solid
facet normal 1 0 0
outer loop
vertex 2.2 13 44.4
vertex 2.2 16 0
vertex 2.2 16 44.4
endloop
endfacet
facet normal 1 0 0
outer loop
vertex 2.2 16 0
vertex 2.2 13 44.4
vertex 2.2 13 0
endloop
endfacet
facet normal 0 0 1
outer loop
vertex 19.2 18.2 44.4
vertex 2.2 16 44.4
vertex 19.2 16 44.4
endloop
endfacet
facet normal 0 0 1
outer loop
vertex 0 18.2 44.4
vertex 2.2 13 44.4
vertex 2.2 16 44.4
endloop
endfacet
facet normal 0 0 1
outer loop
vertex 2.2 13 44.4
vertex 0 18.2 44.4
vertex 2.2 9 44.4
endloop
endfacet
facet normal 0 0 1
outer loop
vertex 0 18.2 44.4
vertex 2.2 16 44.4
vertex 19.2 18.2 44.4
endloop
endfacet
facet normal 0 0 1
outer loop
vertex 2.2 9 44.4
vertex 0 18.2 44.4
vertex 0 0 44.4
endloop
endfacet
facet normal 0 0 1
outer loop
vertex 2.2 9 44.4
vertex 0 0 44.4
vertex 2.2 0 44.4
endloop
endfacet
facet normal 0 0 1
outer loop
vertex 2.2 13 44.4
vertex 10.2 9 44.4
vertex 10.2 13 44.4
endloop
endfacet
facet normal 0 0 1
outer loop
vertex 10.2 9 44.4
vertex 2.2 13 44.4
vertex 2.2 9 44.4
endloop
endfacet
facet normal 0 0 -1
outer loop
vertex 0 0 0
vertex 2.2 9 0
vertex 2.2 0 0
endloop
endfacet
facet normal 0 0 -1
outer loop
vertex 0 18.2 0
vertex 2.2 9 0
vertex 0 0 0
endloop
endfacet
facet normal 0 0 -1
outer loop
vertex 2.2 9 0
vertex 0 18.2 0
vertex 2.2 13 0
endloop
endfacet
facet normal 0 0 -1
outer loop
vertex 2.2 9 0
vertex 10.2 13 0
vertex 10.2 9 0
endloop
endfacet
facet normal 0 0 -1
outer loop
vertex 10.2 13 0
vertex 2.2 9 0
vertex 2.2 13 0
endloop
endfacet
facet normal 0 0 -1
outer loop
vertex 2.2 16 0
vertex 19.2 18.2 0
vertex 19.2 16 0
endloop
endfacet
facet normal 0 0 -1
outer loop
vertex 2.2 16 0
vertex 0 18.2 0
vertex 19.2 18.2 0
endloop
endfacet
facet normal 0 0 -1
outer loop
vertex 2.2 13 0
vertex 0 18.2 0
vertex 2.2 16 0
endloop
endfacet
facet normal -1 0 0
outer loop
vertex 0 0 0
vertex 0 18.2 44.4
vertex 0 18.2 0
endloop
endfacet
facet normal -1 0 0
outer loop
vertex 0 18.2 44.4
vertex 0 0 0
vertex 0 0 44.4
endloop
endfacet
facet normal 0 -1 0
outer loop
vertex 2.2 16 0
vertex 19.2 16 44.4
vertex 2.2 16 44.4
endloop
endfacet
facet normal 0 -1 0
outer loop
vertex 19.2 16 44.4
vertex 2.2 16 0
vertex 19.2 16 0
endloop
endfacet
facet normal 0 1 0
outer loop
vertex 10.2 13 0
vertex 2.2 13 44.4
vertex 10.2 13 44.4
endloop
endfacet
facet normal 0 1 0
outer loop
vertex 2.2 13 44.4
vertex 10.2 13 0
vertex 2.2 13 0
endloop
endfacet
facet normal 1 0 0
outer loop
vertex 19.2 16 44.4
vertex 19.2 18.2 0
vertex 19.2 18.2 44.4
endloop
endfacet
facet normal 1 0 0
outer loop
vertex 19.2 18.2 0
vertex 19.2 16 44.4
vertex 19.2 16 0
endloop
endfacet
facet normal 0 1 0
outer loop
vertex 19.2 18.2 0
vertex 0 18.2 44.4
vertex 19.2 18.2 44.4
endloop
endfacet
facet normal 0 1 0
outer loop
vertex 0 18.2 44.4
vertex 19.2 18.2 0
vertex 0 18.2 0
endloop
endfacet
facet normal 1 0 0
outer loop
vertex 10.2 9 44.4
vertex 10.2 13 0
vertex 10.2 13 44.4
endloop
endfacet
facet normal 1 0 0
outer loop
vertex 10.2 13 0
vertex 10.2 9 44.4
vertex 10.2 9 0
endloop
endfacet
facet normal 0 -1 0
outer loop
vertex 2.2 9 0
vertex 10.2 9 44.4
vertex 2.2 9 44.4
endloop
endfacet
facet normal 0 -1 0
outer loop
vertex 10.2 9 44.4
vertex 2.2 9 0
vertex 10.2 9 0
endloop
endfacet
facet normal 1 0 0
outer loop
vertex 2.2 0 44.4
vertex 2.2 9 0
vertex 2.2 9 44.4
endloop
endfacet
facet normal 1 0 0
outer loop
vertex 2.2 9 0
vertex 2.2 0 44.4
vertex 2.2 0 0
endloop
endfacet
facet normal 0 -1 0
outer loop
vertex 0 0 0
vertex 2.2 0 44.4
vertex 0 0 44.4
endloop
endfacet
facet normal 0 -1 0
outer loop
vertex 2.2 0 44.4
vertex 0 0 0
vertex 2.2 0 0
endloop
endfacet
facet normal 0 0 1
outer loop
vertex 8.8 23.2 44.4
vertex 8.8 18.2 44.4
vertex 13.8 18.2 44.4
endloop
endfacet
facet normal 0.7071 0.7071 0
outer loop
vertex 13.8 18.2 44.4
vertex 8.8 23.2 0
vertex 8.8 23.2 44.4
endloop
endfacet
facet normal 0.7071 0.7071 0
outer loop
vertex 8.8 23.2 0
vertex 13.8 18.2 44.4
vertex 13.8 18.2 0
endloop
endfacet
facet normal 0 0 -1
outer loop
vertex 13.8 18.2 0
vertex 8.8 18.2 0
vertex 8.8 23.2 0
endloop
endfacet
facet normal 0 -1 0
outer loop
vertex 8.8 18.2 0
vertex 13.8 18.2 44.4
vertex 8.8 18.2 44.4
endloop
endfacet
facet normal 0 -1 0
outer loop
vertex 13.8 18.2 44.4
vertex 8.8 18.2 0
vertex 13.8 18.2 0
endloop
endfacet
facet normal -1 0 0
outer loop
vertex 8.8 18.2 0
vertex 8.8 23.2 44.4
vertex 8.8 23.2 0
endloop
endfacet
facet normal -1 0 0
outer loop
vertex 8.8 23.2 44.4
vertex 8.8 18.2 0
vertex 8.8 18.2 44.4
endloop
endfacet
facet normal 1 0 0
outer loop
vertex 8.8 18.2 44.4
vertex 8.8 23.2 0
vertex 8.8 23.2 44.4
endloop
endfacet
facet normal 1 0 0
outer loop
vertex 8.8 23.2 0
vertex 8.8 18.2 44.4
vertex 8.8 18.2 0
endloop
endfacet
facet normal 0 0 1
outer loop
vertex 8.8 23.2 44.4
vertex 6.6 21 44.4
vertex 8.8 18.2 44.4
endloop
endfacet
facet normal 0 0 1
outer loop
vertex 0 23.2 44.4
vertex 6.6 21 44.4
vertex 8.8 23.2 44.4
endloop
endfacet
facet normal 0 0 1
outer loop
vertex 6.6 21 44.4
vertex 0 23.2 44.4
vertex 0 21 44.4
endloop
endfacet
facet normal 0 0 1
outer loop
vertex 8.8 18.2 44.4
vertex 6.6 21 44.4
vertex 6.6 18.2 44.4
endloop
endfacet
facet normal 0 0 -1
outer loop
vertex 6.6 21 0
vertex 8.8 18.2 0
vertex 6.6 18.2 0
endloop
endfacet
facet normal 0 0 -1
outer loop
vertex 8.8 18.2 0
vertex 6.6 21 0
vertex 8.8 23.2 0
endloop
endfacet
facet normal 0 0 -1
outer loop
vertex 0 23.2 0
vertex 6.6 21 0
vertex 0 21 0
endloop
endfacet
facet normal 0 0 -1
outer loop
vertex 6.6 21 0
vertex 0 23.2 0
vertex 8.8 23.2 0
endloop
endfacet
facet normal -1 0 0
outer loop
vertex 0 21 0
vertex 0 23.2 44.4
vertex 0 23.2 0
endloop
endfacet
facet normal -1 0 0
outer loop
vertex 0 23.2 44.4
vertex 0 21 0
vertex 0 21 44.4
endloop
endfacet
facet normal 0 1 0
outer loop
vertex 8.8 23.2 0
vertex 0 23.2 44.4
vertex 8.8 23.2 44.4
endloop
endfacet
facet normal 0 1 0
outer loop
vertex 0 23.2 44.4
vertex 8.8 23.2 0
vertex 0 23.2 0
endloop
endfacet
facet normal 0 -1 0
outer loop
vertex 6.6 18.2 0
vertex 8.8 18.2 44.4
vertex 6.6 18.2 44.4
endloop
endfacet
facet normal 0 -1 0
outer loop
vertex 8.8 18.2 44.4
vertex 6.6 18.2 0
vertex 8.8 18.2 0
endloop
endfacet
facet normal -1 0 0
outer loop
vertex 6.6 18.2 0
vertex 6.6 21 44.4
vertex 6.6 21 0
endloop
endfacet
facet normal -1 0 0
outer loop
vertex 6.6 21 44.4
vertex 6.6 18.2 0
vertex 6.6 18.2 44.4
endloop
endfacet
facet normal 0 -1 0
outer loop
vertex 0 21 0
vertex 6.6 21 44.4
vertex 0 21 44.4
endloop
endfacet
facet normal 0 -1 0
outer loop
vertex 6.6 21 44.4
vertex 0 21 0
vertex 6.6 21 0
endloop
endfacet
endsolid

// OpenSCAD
$fn = 60;

hor2Gleuf       =    9;  // afstand van hor tot de inkeping in het profiel
bGleuf          =    4;  // breedte van inkeping in het profiel
dGleuf          =    8;  // diepte van inkeping in het profiel
gleuf2Rand      =    3;  // vanaf inkeping tot rand van het profiel
dMax            =    5;  // maximaal uitsteken vanaf het profiel
rand2Profiel    =   17;
dStang          = 10.2; // diameter verstovingingsstangen

dMagneet        = 20;   // diameter magneet
hMagneet        = 1.2;  // hoogte magneet

wall = 2.2;
plaat = 2.8;

/////////// berekend //////////////////
hProfiel = hor2Gleuf + bGleuf + gleuf2Rand + wall;

translate([dMagneet, 0, 0] * 0) plaatClip();
//translate([dMagneet, 0, 0] * 3) magneetClip();
//translate([dMagneet, 0, 0] * 6) stangClipMagneet();


module plaatClip() {
    h = dMagneet * 2 + wall * 2;
    cube = [wall * 4 , wall + plaat, h];
    profiel(h);
    translate([cube.x, hProfiel, 0]) {
        steun(h = h, b = cube.y);
    }
    
    translate([0, hProfiel , 0]) {
        difference() {
            cube(cube);
            translate([-wall, 0, -h]) {
                cube([wall * 4, plaat, h * 3]);
            }
        }
    }
}

module steun(h=100, b = 10) {
    
    cube = [b / cos(45), b / cos(45), h];
    translate([0, 0, h / 2]) {
        difference() {
            rotate([0, 0, 45])
                cube (cube, center = true);
            translate([-cube.x, -cube.y * 2, -cube.z])
                cube(cube * 2, center = false);
            translate([-cube.x * 2, -cube.y, -cube.z])
                cube(cube * 2, center = false);
        }
    }
}

module stangClipMagneet() {
    h = dMagneet + wall * 2;
    dOut = dStang + wall * 2;
    dx = (dStang + wall) / 2;
    y = h * 2 ;
    dM = y/2 - wall -dMagneet / 2;
    
    translate([0, 0, h/2]) {
        difference() {
            union() {
                rotate([0, 0, 180])
                klem(dIn = dStang, dOut = dOut, h = h, hoek = 60);
                translate([dx, 0, 0]) {
                    cube([wall, y, h], center = true);  
                }
                translate([dOut / 4, 0, 0]) {
                    cube([dOut / 2, dOut, h], center = true);
                }
            }
            cylinder(d = dStang, h = h * 2, center = true);
            for (i = [-1, 1]) {
                translate([dx + wall / 2 - hMagneet, dM * i, 0])
                    rotate([0, 90, 0])
                        cylinder(d = dMagneet, h = h); 
            }
        }
    }
}

module klem(dIn = 100, dOut = 150, h = 100, hoek = 20) {
    rotate([0, 0, -90]) {
        difference() {
            cylinder(d = dOut, h = h, center = true); 
            cylinder(d = dIn, h = h * 2, center = true);
            translate([0, 0, -h])
            driehoek(hoek = hoek, l = h, h = h * 2); 
        }
        
        hk = hoek / 2;
        dC = (dOut - dIn) / 2;
        l = (dIn + dC) / 2;
        for(i = [1, -1]) {
            translate(l * [i * cos(hk), sin(hk)]) {
                cylinder(d = dC, h = h, center = true);
            }
        }
    }
}

/*
    gelijkbenige driehoek
    met de opgegeven hoek en hoogte
 */
module driehoek(hoek, l, h) {
    
    hk = hoek / 2;
    x = l / sin(hk);
    linear_extrude(h) {
        polygon([[0, 0], x * [cos(hk), sin(hk)], x * [-cos(hk), sin(hk)]]); 
    }
}

module hoek() {
}

module magneetClip() {
    h = dMagneet + wall * 2;
    cube = [wall * 2 + dMagneet, wall * 2, h];
    dY = hProfiel - cube.y;
    difference() {
        union() {
            profiel(h);
            translate([-cube.x, dY, 0]) {
                cube(cube);
            }
            translate([0, dY, h / 2])
            rotate([0, 0, 45]) {
                cube([wall, wall, h], center = true);
            }
        }
        translate([-cube.x / 2, dY + cube.y -hMagneet, h / 2])
            rotate([0, 90, 90])
                cylinder(d = dMagneet, h = h);

    }
}

module profiel(h, magneet = false) {
    cube([wall, hor2Gleuf, h]);
    translate([0, hor2Gleuf, 0]) {
        cube([dGleuf + wall, bGleuf, h]);
        translate([0, bGleuf, 0]) {
            cube([wall, gleuf2Rand, h]);
            translate([0, gleuf2Rand, 0]) {
                difference() {
                    cube([wall + rand2Profiel, wall, h]);
                    if(magneet) {
                        translate([wall + rand2Profiel / 2,  -h + hMagneet, h / 2]) {
                            rotate([0, 90, 90]) {
                                cylinder( d = dMagneet, h = h);
                            }
                        }
                    }
                }
            }
        }
    }
}
